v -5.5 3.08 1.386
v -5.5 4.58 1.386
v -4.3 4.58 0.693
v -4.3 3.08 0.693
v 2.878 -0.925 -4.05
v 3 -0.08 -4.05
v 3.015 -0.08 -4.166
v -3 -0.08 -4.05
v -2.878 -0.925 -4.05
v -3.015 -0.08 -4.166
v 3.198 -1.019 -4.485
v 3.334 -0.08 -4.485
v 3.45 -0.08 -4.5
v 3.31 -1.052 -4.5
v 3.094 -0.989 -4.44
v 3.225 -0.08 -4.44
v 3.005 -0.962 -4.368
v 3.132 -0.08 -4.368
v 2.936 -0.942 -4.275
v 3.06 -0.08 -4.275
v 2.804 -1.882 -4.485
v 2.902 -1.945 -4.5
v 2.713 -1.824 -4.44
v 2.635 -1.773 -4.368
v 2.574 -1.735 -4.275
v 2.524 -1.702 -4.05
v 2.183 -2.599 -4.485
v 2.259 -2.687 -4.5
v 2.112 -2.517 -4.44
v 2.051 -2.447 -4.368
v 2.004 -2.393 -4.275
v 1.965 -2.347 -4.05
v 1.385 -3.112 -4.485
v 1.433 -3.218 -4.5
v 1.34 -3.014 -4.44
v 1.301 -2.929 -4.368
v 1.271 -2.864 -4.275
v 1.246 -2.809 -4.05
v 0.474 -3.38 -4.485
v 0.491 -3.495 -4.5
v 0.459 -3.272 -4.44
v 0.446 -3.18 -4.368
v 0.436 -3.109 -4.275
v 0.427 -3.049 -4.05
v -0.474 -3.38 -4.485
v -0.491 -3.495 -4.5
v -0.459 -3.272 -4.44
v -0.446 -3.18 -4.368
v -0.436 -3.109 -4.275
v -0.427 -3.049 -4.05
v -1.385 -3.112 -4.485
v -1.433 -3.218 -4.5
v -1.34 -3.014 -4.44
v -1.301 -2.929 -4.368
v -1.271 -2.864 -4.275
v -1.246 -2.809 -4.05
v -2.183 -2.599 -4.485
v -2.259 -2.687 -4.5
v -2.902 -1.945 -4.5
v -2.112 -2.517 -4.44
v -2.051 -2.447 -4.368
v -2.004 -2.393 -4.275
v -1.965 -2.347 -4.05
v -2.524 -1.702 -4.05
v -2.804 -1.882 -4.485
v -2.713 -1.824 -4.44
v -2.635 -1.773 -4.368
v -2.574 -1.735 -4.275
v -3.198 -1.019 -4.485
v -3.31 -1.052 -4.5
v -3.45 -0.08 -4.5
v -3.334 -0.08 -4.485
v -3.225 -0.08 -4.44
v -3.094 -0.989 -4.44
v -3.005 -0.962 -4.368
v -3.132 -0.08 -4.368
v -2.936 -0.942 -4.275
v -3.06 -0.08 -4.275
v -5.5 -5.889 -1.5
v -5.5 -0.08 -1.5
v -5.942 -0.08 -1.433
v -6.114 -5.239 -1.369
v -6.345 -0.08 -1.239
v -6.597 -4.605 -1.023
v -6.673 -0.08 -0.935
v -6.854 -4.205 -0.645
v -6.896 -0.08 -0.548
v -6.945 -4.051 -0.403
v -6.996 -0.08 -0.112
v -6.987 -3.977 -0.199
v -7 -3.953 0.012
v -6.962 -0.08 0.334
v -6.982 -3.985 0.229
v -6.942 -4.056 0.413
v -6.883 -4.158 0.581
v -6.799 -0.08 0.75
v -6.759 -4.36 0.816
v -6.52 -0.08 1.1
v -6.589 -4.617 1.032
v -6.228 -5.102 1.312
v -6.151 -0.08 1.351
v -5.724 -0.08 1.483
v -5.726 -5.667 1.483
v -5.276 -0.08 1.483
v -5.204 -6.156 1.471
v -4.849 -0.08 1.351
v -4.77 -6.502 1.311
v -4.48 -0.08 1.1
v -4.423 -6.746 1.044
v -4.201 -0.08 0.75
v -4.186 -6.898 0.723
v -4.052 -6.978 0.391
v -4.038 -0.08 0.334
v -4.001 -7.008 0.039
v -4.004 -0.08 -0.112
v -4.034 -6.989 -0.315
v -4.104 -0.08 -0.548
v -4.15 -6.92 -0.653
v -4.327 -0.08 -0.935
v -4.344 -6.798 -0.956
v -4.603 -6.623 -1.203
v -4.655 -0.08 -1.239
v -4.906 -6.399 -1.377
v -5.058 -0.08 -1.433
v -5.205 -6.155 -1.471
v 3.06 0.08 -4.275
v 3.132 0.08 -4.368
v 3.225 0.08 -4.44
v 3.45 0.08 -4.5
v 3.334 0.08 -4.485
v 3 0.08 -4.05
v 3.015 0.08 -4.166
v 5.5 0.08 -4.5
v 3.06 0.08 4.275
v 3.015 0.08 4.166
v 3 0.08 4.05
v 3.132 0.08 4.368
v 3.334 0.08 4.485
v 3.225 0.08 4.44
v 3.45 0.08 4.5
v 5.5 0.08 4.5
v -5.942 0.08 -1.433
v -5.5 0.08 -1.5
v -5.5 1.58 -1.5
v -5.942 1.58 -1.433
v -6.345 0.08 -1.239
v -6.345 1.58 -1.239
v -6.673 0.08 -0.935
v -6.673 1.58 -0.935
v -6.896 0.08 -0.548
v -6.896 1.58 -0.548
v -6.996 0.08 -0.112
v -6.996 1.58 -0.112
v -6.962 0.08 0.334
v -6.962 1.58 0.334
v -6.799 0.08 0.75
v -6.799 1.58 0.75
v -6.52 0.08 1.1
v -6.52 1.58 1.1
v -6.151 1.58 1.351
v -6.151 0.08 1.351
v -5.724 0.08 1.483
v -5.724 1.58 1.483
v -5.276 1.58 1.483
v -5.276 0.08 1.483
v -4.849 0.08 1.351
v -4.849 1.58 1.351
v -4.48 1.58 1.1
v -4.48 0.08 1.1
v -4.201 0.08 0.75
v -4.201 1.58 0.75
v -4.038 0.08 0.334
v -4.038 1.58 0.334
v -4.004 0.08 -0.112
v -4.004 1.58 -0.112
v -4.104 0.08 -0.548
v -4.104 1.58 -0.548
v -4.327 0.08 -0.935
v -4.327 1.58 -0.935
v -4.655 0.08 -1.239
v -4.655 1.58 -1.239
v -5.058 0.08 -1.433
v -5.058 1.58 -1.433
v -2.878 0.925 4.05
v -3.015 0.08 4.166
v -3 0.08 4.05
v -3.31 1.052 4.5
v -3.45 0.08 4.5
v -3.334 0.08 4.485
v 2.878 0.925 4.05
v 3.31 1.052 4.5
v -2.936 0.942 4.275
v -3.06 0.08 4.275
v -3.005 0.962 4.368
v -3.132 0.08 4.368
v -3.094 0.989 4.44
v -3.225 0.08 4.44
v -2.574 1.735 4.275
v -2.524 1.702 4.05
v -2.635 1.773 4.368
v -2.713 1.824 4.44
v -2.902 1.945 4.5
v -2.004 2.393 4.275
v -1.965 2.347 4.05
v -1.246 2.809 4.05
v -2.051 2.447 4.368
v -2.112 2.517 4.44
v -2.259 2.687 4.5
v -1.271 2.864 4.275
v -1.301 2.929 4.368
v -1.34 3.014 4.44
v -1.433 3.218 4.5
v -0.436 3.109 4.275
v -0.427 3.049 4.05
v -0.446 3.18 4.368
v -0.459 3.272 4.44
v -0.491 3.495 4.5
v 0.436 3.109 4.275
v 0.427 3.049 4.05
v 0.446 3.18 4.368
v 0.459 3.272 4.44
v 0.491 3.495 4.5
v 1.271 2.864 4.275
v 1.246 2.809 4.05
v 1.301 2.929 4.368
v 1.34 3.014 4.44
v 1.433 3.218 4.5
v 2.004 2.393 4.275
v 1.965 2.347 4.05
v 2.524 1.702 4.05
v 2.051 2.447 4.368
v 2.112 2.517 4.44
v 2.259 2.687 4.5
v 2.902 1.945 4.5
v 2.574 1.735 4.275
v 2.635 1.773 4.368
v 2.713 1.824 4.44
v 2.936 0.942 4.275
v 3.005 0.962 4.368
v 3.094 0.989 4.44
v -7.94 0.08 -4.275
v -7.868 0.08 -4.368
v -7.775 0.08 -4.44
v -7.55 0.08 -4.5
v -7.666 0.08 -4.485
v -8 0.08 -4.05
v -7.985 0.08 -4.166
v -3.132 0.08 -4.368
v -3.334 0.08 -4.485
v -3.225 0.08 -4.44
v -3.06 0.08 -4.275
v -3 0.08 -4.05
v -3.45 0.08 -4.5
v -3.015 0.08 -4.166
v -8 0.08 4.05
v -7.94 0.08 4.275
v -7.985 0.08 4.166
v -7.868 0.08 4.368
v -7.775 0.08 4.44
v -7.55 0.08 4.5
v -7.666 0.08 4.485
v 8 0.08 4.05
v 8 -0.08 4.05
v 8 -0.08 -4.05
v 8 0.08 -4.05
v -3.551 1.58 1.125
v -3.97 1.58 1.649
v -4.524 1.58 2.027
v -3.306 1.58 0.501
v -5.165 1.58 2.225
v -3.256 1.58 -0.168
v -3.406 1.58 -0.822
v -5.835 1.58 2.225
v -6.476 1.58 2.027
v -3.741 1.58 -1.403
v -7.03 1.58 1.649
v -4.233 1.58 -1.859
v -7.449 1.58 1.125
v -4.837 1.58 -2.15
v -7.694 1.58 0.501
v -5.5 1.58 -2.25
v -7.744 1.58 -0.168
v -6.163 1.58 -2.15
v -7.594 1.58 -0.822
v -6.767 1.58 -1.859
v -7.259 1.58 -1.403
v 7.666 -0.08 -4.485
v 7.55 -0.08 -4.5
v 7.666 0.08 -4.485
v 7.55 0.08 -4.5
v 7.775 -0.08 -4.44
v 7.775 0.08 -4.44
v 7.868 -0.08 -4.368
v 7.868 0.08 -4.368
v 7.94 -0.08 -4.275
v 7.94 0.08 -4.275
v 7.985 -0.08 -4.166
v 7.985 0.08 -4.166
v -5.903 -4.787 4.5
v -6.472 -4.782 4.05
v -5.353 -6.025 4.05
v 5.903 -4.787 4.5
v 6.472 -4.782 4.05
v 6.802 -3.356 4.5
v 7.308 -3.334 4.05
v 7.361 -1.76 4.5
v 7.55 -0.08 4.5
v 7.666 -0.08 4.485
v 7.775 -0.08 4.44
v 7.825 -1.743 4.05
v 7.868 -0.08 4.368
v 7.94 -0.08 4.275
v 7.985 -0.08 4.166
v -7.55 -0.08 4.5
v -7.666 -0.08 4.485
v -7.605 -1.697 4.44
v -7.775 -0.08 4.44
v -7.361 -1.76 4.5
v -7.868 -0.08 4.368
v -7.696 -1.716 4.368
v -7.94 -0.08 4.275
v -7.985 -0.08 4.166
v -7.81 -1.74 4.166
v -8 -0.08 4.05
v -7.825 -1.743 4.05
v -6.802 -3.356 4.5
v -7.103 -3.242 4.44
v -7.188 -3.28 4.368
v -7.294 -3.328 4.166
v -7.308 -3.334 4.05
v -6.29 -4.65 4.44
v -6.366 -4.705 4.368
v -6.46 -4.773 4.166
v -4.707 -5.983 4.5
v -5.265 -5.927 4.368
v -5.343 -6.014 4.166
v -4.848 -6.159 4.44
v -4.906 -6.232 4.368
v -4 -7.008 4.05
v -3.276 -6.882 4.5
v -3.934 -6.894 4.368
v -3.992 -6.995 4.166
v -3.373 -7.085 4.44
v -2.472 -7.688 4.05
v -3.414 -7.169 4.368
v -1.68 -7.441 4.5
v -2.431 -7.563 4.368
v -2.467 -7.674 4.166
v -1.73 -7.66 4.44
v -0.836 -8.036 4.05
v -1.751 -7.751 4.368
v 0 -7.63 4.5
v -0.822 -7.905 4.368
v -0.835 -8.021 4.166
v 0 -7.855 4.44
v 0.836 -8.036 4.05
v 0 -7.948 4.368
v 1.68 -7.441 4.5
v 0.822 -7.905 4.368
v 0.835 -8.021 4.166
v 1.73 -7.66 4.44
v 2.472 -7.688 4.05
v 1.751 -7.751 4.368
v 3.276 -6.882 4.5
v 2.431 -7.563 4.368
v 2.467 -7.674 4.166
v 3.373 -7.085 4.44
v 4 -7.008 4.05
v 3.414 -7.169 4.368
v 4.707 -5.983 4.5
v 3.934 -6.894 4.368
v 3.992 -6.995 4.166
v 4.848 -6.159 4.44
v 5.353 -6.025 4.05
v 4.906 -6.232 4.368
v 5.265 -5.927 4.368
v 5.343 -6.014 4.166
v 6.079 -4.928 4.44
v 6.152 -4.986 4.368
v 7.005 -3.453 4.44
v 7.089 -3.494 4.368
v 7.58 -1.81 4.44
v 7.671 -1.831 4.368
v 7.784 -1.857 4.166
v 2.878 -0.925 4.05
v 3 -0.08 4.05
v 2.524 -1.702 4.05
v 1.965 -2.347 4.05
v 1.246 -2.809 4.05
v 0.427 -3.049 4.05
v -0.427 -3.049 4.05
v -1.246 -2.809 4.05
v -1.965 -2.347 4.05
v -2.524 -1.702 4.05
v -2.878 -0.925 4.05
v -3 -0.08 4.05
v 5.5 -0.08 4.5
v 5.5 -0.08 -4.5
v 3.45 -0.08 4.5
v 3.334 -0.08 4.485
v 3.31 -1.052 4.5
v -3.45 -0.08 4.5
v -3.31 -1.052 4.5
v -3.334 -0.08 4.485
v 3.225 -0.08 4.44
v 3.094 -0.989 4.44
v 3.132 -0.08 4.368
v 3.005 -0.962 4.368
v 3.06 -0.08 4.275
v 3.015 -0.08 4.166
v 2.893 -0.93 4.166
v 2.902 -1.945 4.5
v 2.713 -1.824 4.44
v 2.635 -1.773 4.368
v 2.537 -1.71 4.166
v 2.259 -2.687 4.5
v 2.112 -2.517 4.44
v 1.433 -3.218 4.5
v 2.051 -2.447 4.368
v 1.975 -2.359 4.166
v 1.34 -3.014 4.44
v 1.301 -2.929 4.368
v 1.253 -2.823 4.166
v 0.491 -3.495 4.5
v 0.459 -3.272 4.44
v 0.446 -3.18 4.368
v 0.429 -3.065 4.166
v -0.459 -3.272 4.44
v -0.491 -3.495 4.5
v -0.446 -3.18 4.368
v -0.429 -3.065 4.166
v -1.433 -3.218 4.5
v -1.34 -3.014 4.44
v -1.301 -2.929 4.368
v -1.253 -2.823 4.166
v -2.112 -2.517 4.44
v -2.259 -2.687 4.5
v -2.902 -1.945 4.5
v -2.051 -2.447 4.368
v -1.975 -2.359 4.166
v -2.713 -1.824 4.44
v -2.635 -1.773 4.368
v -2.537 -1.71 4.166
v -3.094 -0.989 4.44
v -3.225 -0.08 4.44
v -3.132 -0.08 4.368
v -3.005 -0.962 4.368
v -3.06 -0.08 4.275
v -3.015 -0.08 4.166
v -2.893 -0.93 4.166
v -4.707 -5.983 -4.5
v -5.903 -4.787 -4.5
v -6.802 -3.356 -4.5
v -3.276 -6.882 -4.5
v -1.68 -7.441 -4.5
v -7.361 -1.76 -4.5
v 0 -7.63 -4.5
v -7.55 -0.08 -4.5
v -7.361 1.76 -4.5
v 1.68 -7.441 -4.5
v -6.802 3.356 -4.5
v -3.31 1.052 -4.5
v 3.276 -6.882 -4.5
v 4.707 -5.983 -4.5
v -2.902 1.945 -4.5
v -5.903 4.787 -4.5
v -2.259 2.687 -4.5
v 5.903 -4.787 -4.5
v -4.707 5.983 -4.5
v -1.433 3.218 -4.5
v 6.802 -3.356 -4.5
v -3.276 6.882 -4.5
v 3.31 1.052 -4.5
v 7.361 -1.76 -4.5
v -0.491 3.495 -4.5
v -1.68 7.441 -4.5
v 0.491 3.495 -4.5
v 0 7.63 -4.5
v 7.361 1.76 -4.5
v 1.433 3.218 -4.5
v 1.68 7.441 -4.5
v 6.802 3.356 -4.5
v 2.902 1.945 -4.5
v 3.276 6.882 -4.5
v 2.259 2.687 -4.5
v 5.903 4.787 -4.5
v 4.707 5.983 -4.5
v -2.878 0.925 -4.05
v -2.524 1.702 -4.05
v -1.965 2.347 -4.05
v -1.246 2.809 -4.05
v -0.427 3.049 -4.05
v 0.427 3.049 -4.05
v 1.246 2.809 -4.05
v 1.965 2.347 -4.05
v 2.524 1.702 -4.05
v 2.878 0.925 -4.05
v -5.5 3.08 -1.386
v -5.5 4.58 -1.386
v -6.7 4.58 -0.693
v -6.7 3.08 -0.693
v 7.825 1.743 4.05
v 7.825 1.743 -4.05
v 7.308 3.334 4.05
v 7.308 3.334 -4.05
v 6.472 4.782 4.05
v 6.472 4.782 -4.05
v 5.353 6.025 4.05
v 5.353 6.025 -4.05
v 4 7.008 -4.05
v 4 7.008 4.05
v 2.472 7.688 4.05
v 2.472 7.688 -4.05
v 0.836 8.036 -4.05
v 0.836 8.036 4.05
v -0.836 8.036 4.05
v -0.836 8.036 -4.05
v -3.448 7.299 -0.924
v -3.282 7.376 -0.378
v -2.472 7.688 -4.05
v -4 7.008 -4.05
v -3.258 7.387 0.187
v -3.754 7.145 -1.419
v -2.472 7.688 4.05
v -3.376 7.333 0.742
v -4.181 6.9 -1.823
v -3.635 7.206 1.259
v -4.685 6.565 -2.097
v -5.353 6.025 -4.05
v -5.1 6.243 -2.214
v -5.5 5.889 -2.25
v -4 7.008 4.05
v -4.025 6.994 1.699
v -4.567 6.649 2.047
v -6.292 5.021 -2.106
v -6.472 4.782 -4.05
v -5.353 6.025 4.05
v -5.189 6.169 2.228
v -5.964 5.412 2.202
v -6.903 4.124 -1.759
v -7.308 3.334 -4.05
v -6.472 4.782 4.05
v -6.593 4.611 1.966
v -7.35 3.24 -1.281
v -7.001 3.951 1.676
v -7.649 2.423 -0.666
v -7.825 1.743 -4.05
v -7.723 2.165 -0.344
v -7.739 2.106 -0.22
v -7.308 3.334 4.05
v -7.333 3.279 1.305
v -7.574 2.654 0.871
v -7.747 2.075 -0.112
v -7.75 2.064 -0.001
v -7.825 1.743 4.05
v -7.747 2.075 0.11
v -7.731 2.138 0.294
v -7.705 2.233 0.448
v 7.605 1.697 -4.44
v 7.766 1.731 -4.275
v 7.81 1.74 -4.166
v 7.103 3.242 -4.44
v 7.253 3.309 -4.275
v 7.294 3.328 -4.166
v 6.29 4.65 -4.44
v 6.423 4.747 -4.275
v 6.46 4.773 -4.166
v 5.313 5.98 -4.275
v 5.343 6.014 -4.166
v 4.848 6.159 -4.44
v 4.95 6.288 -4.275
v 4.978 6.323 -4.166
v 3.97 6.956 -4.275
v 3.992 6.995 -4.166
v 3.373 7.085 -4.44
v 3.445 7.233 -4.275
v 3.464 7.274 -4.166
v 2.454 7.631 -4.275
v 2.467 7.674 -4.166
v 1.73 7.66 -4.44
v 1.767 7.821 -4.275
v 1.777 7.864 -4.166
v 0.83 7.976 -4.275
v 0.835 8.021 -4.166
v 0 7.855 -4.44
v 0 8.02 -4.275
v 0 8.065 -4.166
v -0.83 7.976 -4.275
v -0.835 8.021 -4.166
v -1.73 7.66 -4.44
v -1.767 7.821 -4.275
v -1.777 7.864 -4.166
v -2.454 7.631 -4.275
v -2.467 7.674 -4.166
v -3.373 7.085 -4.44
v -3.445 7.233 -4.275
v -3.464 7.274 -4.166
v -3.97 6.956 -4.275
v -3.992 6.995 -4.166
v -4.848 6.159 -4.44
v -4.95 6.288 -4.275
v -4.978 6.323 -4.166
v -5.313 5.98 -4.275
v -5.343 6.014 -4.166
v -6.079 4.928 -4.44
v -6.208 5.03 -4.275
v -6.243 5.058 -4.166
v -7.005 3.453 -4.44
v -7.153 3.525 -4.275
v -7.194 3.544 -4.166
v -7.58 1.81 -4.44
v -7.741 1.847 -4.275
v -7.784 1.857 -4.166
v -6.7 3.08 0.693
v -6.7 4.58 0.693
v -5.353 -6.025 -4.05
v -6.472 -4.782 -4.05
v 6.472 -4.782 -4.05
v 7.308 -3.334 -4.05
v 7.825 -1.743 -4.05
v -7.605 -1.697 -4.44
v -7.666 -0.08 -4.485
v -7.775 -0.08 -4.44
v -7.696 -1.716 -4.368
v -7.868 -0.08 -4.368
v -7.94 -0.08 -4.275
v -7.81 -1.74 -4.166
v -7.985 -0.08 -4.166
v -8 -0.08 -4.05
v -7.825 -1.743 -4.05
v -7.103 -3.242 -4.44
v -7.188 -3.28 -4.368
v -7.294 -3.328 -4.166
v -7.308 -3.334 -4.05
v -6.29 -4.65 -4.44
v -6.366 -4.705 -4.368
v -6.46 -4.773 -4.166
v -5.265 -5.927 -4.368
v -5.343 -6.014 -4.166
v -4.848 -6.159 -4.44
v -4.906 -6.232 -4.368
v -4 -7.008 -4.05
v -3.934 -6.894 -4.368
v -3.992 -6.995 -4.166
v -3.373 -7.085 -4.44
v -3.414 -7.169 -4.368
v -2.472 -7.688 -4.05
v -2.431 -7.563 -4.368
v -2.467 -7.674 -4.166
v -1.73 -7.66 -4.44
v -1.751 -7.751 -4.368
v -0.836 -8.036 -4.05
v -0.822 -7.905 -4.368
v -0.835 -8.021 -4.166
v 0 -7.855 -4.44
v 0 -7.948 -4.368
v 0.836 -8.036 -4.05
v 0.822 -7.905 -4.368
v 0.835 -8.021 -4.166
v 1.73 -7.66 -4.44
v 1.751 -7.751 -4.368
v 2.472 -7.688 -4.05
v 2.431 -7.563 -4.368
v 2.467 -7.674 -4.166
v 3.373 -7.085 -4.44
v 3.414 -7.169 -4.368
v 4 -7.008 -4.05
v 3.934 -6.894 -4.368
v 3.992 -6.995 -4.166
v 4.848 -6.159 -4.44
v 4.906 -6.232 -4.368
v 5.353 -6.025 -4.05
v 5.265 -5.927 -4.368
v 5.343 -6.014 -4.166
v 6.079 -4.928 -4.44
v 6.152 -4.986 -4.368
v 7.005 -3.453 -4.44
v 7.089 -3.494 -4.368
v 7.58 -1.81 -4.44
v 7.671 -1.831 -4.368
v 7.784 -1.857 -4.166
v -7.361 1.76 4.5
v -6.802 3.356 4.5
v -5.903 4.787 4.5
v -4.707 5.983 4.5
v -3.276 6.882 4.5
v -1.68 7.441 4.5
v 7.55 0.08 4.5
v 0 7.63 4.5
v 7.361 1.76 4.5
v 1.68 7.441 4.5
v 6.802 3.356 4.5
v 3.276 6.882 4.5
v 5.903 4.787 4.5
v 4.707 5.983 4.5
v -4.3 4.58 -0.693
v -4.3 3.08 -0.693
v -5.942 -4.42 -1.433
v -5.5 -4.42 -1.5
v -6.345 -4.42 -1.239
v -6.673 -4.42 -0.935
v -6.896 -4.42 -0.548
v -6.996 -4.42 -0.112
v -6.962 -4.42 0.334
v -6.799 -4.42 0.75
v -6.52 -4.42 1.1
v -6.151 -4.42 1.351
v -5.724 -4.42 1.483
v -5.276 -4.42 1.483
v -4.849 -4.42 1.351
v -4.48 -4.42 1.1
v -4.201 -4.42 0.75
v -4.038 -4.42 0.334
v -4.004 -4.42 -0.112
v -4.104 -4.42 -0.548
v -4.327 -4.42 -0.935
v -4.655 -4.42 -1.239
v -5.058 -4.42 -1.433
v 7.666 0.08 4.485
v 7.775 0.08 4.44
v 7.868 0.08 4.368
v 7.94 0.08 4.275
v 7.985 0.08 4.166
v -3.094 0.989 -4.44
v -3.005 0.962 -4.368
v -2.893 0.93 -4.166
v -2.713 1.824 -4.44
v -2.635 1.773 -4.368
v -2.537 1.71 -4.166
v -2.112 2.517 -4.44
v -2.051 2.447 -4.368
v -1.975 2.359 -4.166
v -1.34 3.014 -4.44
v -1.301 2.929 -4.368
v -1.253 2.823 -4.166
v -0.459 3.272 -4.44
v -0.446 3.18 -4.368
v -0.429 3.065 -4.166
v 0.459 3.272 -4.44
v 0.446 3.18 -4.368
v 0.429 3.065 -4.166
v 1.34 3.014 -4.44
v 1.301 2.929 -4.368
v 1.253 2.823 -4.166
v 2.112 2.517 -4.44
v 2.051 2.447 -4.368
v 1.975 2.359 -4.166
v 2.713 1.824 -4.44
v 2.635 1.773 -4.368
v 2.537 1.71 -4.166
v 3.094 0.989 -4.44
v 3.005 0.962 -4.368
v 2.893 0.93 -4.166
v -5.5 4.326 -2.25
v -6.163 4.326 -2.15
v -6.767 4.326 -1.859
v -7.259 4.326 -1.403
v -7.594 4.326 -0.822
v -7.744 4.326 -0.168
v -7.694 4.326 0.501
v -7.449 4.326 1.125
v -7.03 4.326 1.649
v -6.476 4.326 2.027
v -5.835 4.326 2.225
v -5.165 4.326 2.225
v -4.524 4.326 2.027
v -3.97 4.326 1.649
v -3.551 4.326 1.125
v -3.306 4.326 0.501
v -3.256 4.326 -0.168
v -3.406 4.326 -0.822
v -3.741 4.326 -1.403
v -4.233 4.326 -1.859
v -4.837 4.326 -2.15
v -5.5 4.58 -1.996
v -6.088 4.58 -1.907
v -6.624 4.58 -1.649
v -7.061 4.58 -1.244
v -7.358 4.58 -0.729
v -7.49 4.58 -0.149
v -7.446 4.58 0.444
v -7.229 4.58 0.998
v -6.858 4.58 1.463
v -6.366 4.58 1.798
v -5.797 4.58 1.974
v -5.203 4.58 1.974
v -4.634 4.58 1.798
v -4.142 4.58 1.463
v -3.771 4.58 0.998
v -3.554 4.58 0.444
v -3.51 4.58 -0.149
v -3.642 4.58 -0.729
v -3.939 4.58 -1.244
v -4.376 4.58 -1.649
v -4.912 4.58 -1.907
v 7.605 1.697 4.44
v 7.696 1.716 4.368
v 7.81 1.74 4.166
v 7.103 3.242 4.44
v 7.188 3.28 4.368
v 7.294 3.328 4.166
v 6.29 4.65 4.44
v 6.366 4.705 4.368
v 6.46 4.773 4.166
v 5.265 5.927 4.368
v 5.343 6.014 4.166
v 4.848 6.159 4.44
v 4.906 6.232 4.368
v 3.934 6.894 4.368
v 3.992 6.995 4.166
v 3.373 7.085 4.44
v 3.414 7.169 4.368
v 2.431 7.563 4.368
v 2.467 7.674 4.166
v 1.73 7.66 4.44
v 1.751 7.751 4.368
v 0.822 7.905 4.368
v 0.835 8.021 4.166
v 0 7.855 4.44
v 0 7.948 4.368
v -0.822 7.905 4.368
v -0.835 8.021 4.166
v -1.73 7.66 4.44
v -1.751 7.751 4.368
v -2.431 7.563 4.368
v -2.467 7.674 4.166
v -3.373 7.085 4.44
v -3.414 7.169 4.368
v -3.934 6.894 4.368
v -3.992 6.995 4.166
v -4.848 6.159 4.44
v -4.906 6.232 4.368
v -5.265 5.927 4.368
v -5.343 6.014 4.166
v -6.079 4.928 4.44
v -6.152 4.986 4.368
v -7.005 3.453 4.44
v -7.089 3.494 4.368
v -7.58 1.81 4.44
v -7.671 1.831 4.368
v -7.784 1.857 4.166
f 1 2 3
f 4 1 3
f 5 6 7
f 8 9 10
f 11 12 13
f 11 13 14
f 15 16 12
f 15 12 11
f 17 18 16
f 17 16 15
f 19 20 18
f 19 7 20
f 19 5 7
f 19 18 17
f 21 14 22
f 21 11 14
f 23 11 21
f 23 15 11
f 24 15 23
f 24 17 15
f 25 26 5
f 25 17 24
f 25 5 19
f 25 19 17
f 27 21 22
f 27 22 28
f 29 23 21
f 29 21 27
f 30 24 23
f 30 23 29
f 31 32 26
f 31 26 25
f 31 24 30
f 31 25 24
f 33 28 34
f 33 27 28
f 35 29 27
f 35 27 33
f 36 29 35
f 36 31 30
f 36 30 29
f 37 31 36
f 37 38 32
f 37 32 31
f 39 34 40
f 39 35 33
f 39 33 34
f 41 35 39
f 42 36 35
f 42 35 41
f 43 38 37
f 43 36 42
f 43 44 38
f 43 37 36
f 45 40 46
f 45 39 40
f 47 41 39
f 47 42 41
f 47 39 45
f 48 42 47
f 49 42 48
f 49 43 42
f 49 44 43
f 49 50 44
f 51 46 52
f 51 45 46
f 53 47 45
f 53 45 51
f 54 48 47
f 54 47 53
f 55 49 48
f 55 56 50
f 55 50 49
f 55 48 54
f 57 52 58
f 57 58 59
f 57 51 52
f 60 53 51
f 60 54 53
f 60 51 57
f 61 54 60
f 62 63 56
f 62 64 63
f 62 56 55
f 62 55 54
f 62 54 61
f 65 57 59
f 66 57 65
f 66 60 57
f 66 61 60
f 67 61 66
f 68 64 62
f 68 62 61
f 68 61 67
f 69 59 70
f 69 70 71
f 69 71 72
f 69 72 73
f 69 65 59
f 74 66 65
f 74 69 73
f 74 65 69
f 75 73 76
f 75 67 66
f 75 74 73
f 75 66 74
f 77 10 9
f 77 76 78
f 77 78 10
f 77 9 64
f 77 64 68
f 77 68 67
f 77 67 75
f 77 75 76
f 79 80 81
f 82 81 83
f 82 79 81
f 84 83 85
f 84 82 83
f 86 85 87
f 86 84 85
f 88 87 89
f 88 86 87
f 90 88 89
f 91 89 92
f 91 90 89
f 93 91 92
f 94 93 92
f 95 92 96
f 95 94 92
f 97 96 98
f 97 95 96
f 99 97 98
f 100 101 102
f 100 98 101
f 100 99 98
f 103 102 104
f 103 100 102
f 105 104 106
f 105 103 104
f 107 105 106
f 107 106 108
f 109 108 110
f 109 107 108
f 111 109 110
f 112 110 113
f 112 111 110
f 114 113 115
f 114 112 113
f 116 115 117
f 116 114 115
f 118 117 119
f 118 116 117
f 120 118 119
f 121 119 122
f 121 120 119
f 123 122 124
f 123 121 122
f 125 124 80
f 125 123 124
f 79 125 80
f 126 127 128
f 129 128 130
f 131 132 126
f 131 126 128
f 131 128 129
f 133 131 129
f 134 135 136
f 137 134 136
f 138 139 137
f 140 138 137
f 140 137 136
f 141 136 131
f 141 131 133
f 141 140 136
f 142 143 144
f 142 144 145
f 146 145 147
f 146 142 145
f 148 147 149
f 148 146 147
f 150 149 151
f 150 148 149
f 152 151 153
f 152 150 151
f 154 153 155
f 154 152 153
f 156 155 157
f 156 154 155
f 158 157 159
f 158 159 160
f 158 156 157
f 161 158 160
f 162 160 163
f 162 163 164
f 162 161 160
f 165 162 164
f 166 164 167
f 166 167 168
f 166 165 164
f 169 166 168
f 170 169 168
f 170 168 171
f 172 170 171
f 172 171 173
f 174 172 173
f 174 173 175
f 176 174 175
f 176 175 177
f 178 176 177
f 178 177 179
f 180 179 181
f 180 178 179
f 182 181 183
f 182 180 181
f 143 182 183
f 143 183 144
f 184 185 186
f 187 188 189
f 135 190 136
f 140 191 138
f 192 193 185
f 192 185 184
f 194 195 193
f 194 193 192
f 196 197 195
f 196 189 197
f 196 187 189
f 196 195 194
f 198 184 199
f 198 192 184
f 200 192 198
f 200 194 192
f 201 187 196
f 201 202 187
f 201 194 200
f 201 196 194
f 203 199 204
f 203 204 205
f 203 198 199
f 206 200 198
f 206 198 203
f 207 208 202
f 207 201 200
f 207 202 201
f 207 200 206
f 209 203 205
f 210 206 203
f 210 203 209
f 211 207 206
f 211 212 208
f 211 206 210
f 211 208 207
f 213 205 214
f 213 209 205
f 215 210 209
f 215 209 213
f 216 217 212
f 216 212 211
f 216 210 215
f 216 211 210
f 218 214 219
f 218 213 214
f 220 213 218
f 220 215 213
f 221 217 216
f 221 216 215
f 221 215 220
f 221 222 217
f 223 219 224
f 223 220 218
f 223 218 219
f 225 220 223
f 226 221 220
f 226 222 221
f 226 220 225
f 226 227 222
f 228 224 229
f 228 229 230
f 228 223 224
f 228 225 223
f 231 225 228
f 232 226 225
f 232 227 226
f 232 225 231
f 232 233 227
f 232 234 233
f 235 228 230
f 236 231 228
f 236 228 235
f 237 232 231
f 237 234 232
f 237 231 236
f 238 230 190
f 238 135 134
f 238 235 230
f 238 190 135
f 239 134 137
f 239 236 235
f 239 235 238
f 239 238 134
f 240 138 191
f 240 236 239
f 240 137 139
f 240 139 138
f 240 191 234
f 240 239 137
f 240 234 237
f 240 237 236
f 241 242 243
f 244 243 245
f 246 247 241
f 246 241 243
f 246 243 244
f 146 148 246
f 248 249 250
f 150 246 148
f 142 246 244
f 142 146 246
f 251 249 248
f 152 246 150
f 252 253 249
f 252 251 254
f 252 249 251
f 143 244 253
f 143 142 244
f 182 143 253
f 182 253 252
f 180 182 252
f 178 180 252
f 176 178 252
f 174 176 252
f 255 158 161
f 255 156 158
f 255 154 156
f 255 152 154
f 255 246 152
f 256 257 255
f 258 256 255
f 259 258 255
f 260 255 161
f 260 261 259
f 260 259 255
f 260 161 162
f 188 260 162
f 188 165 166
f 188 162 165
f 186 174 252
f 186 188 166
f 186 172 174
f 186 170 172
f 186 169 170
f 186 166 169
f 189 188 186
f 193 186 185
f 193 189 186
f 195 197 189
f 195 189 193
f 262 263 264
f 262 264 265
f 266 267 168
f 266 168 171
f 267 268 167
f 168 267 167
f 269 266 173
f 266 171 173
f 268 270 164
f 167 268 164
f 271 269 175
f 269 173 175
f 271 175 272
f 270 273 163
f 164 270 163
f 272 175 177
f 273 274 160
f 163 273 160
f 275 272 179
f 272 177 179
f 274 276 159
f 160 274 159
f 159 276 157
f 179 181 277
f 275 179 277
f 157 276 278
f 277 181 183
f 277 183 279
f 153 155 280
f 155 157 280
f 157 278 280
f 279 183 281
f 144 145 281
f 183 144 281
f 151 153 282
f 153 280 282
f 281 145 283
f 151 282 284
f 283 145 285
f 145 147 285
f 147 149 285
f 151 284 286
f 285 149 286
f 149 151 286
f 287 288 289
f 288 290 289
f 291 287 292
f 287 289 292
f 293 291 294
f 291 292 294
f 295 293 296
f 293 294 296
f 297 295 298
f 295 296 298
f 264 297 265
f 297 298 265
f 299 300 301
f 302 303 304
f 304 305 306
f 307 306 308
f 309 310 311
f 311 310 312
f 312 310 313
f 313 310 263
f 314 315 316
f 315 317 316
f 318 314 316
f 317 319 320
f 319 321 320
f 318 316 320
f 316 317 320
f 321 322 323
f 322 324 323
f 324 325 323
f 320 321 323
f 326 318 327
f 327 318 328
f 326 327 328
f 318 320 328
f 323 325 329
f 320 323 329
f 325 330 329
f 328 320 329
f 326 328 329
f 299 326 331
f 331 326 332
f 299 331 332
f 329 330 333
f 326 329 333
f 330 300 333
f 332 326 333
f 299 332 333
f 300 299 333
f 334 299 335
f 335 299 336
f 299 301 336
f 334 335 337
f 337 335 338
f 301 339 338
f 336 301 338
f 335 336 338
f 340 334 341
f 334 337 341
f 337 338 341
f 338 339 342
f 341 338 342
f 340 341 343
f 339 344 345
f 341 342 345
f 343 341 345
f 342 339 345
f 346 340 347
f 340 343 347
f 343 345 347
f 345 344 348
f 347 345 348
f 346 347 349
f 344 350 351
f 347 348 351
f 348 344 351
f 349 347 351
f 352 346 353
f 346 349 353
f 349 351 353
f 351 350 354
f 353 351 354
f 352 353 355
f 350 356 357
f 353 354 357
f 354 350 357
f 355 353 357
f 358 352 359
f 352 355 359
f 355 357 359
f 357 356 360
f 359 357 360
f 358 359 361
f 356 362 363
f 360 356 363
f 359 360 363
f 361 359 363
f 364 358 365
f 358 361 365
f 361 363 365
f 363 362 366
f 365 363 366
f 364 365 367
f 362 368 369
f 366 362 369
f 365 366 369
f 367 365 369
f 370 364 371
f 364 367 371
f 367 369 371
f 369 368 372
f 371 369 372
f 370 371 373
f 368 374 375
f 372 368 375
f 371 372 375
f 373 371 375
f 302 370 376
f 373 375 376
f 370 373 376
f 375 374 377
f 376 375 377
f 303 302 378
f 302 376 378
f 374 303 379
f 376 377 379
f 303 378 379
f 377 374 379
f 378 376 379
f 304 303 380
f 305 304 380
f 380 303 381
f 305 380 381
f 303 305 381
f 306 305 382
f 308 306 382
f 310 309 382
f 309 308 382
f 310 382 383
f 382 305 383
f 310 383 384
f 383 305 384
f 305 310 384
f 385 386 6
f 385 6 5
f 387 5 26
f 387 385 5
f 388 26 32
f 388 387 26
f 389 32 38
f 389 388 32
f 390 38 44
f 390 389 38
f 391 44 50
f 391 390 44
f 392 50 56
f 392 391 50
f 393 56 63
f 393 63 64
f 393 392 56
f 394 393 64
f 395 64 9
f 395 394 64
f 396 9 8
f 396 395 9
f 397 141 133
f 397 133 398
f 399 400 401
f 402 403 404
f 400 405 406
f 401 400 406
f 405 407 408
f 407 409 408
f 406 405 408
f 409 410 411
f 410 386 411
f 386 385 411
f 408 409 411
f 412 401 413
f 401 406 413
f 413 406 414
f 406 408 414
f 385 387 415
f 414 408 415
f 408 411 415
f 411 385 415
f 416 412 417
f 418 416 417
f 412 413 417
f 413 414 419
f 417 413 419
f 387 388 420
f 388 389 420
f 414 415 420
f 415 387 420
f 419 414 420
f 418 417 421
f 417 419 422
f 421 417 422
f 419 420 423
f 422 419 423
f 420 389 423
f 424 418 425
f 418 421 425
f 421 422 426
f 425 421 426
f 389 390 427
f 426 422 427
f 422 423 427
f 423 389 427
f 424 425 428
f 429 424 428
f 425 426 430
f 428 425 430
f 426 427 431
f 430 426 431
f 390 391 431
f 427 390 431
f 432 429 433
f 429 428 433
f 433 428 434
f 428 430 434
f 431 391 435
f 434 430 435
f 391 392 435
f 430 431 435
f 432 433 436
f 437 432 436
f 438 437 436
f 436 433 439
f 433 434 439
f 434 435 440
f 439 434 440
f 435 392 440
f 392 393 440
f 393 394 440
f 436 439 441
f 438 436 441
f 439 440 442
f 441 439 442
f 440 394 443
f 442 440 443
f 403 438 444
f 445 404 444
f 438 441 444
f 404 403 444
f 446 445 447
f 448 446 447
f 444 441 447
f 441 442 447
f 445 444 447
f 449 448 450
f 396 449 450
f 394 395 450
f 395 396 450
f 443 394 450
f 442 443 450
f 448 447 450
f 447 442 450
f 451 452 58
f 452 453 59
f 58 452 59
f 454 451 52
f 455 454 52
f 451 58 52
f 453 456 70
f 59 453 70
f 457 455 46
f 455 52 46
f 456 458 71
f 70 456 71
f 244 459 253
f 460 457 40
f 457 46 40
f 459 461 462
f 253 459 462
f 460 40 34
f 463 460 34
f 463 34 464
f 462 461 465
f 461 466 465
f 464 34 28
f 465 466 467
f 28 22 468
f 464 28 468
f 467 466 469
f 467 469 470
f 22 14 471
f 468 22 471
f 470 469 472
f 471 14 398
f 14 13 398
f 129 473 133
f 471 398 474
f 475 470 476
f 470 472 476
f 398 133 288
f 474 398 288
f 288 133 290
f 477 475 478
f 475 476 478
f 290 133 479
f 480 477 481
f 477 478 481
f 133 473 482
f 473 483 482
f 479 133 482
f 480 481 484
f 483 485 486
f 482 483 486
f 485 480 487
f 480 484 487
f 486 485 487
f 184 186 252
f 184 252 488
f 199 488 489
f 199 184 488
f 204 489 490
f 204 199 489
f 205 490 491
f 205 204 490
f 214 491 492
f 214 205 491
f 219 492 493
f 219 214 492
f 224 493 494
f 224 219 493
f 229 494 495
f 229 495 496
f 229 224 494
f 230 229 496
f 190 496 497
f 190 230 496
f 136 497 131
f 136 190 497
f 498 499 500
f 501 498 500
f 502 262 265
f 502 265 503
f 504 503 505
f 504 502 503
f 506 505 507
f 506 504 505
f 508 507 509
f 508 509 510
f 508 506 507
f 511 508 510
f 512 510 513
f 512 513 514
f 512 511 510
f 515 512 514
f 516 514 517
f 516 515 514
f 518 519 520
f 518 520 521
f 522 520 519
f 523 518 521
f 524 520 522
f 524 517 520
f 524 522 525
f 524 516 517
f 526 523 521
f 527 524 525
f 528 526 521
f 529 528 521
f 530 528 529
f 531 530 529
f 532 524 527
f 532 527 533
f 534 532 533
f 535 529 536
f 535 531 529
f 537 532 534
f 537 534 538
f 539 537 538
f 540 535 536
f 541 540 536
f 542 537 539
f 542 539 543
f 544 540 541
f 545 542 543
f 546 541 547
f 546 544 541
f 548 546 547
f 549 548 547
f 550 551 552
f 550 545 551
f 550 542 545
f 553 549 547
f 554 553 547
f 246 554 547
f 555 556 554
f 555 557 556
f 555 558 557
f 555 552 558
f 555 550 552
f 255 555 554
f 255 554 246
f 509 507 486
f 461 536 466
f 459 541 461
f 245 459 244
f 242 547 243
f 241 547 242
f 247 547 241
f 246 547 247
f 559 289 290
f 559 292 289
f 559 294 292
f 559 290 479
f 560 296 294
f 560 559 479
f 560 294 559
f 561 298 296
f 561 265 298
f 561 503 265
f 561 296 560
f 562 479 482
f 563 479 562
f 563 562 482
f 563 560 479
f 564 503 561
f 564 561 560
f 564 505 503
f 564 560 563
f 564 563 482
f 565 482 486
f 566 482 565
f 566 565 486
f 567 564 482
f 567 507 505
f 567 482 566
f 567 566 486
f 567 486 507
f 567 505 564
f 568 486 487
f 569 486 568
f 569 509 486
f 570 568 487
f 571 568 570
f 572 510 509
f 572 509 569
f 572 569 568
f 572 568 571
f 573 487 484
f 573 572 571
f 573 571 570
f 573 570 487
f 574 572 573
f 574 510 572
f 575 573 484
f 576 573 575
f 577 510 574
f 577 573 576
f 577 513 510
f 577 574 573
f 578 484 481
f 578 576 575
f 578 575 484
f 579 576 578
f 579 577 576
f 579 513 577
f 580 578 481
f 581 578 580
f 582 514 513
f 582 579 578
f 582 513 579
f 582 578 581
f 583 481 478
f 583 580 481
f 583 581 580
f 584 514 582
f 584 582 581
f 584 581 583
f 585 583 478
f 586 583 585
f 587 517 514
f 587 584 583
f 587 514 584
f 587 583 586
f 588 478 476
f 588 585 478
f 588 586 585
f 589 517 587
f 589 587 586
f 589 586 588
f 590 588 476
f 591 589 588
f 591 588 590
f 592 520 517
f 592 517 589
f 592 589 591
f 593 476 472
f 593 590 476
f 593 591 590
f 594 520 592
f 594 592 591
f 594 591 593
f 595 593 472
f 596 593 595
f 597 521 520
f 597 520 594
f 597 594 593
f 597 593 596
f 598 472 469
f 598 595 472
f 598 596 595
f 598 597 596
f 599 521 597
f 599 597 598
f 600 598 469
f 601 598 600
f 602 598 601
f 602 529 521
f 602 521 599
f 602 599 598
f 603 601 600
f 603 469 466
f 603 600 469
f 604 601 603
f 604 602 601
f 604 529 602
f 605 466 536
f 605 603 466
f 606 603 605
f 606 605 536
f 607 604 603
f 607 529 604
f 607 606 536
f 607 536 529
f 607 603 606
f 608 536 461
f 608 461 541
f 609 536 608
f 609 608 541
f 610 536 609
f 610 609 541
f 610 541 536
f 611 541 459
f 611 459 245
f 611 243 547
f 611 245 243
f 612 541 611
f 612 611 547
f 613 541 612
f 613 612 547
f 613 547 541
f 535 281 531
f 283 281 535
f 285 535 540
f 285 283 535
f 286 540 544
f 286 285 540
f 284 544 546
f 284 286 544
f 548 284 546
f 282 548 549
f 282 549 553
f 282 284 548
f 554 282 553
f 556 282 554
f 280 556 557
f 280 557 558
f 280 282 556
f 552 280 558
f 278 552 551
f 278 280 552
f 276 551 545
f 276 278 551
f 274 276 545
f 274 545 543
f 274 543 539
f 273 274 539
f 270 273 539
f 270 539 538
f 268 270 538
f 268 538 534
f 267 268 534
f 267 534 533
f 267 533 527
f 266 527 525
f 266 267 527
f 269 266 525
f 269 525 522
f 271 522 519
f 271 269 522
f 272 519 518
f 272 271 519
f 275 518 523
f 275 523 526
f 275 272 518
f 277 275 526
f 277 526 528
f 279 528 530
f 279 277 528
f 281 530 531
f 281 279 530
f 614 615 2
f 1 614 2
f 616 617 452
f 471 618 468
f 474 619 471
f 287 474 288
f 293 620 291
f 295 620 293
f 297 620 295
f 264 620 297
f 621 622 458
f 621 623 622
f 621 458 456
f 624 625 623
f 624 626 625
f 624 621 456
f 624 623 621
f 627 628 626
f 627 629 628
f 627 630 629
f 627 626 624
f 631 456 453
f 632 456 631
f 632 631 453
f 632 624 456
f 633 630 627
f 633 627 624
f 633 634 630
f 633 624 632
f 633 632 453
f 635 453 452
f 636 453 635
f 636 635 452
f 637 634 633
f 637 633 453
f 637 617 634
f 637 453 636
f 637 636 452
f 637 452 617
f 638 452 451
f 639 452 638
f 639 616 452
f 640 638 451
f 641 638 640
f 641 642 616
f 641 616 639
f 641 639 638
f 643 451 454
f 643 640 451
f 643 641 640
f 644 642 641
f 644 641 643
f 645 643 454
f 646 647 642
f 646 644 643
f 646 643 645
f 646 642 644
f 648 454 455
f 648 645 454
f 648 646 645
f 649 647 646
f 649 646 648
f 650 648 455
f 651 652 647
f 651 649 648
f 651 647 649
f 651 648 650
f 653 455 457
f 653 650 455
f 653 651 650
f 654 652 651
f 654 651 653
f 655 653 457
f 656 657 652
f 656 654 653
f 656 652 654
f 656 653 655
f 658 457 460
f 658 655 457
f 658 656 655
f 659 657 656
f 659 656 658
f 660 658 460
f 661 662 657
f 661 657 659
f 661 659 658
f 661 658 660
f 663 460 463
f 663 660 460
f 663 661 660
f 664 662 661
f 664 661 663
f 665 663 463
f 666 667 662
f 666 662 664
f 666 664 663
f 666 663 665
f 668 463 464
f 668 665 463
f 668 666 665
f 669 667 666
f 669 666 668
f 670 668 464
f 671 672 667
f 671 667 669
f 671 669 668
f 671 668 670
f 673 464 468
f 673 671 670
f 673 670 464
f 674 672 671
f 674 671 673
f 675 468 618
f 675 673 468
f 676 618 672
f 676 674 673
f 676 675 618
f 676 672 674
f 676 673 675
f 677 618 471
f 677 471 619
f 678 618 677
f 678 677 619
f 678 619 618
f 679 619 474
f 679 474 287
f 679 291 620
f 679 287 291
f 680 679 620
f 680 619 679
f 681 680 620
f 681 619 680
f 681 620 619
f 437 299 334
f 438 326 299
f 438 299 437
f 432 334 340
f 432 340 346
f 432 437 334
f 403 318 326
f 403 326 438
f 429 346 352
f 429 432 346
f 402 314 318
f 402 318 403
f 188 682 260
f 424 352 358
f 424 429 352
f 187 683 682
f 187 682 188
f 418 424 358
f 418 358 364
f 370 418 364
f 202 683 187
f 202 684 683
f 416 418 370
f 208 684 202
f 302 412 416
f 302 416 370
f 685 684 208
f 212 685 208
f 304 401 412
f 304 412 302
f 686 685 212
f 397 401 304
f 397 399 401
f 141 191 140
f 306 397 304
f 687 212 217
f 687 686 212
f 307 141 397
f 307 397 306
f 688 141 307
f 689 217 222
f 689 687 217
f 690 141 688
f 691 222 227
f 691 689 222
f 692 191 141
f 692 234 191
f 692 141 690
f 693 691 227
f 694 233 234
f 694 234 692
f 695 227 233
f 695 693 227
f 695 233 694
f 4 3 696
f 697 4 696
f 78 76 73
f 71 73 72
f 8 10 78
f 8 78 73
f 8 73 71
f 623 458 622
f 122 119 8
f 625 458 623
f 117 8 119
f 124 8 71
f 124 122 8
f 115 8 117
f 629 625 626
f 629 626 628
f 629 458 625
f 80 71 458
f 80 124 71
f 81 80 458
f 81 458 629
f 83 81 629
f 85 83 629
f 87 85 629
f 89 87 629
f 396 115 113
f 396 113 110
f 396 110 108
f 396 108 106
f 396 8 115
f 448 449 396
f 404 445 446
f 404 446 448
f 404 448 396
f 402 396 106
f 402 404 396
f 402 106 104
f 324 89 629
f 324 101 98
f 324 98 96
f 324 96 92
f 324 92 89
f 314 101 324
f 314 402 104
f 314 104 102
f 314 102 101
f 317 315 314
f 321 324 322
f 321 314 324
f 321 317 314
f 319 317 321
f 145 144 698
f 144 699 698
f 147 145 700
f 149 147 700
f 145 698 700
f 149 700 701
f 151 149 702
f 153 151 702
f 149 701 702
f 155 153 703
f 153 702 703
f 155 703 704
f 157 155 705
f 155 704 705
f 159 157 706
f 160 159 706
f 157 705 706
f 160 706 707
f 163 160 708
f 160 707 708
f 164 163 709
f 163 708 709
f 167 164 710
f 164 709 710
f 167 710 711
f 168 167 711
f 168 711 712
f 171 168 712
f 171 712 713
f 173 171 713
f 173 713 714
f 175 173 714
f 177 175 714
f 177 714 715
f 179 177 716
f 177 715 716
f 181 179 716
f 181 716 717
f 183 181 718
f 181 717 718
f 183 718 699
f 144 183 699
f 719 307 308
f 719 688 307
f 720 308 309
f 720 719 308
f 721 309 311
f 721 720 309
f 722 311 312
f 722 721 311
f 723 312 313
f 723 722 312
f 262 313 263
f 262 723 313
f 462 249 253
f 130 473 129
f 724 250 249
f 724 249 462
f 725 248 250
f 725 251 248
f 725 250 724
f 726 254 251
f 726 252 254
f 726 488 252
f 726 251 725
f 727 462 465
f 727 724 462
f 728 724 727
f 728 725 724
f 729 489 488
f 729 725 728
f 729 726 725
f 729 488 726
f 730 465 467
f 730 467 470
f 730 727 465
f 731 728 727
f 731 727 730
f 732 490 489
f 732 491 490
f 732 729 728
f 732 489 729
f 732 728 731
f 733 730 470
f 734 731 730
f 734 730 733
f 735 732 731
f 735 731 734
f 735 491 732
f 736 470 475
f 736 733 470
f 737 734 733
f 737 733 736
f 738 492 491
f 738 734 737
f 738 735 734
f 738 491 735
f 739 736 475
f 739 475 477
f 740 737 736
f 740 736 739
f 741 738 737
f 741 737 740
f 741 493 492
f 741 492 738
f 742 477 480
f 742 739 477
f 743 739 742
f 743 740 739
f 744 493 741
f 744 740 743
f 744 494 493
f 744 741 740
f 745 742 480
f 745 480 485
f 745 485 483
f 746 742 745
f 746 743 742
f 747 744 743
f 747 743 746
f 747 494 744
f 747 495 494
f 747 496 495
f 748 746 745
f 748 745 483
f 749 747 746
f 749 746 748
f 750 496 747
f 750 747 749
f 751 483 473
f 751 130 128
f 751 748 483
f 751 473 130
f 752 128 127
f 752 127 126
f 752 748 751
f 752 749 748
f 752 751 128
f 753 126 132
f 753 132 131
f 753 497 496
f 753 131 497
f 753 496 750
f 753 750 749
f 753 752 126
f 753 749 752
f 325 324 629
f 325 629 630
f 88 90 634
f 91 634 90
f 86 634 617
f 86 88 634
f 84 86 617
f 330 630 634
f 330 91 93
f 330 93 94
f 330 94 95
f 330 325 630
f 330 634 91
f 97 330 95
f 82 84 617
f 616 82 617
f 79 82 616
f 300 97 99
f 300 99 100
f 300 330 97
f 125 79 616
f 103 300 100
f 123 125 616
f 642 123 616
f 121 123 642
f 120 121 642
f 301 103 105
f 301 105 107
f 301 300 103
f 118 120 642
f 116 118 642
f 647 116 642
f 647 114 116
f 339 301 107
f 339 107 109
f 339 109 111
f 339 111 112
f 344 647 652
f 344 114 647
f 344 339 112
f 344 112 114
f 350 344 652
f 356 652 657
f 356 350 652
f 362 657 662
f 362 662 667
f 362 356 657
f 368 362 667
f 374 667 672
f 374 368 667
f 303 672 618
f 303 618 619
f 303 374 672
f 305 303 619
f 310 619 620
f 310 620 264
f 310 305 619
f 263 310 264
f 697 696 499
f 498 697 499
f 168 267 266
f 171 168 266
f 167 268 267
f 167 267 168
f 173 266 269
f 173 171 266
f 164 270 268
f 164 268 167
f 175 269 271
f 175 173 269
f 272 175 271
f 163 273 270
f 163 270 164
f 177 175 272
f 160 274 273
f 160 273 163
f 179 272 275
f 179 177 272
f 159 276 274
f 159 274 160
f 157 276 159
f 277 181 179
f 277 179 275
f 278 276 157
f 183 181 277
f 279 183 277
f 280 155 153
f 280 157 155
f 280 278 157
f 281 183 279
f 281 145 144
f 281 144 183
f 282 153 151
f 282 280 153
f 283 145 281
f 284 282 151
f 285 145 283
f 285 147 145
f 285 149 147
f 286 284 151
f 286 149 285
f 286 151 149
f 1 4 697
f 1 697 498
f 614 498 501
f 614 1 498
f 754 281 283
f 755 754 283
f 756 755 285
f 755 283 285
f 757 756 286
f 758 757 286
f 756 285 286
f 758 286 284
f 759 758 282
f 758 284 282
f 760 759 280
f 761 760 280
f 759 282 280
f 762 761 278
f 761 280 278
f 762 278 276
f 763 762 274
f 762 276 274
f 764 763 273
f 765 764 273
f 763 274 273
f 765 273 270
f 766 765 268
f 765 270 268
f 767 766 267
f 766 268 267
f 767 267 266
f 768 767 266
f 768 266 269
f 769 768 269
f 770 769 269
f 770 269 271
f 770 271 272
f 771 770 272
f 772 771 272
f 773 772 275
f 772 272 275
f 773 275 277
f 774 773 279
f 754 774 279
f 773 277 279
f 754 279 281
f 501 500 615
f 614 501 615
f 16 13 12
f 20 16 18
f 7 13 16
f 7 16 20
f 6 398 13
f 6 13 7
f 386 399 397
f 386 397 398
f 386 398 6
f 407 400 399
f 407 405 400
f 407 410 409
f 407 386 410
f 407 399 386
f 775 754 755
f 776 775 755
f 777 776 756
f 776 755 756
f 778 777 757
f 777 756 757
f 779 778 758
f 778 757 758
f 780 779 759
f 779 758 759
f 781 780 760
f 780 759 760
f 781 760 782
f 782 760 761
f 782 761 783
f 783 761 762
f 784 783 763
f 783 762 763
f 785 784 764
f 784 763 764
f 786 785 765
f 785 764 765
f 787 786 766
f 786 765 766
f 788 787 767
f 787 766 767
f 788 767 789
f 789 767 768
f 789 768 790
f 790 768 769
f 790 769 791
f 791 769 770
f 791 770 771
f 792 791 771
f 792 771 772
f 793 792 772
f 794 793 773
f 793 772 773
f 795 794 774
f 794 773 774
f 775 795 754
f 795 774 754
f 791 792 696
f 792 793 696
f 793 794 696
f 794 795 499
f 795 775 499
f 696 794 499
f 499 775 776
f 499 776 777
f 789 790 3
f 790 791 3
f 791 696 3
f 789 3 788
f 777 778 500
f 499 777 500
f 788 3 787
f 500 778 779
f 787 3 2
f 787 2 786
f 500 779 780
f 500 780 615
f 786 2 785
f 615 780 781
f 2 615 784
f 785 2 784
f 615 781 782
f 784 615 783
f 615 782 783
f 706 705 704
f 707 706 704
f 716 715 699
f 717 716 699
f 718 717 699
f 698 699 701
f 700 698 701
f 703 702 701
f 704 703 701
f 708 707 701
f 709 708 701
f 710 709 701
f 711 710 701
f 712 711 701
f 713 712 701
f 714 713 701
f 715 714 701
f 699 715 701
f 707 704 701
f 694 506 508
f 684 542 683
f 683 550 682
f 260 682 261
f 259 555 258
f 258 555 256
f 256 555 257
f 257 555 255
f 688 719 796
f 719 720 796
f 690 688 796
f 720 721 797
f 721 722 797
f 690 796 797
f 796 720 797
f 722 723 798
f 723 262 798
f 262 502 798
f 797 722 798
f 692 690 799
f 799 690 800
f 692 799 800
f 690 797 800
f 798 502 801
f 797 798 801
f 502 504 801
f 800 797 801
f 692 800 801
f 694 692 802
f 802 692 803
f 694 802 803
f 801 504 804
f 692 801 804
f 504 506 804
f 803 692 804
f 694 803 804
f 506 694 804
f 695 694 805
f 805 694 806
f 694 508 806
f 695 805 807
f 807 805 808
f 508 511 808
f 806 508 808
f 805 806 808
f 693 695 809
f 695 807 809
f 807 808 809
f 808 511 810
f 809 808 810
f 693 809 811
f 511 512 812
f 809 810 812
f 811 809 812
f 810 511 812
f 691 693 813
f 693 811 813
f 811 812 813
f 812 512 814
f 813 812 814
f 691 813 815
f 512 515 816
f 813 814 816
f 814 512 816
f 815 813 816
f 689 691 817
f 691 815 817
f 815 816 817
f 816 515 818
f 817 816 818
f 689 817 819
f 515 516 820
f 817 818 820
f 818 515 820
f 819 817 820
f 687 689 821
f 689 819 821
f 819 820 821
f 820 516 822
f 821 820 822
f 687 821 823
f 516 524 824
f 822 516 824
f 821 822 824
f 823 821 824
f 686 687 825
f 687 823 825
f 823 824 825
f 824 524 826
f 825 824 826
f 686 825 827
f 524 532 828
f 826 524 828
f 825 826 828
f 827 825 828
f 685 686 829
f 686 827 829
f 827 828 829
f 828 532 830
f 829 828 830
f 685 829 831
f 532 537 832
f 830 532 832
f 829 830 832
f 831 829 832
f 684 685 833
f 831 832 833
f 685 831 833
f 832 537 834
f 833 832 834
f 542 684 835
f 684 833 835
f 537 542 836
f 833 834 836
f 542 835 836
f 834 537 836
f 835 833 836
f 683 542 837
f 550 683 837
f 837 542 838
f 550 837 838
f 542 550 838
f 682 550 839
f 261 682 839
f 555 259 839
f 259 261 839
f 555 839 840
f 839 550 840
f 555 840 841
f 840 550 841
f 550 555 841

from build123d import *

# Parameters (mm, degrees)
EXTRUDE1_DEPTH     = 4.5
CUT_EXTRUDE2_DEPTH = 1.5
FILLET1_R          = 0.45
FILLET2_R          = 0.45
CHAMFER2_SIZE      = 0.254


with BuildPart() as part:
    # Sketch1 → Extrude1 (new, symmetric)
    with BuildSketch(Plane.XY):
        with BuildLine():
            Line((-8, 0.08), (-3, 0.08))
            ThreePointArc((-3, 0.08), (0, 3.08), (3, 0.08))
            Line((3, 0.08), (5.5, 0.08))
            Line((5.5, 0.08), (5.5, -0.08))
            Line((5.5, -0.08), (3, -0.08))
            ThreePointArc((3, -0.08), (0, -3.08), (-3, -0.08))
            Line((-3, -0.08), (-8, -0.08))
            ThreePointArc((-8, -0.08), (0, -8.08), (8, -0.08))
            Line((8, -0.08), (8, 0.08))
            ThreePointArc((8, 0.08), (0, 8.08), (-8, 0.08))
        make_face()
    extrude(amount=EXTRUDE1_DEPTH, both=True)

    # Sketch4 → Cut-Revolve1 (revolve, cut)
    with BuildSketch(Plane.XY):
        Polygon((-5.5, 8.08), (-3.25, 8.08), (-3.25, 1.58), (-4, 1.58), (-4, -8.08), (-5.5, -8.08), align=None)
    revolve(axis=Axis((-5.5, -8.08, 0), (0, 1, 0)), mode=Mode.SUBTRACT)

    # Fillet1
    fillet1_edges = [part.edges().sort_by_distance(p)[0] for p in [
        (0, 3.08, -4.5),
        (0, 3.08, 4.5),
        (0, 8.08, -4.5),
        (0, 8.08, 4.5),
        (0, -8.08, -4.5),
        (0, -8.08, 4.5),
        (8, 0, -4.5),
        (8, 0, 4.5),
    ]]
    fillet(fillet1_edges, radius=FILLET1_R)

    # Fillet2
    fillet2_edges = [part.edges().sort_by_distance(p)[0] for p in [
        (0, -3.08, -4.5),
        (0, -3.08, 4.5),
    ]]
    fillet(fillet2_edges, radius=FILLET2_R)


with BuildPart() as body_2:
    # Sketch6 → Revolve1 (revolve)
    with BuildSketch(Plane.XY):
        Polygon((-5.5, 4.58), (-3.25, 4.58), (-3.25, 1.58), (-4, 1.58), (-4, -4.42), (-5.5, -4.42), align=None)
    revolve(axis=Axis((-5.5, -4.42, 0), (0, 1, 0)))

    # Sketch7 → Cut-Extrude2 (cut)
    with BuildSketch(Plane(origin=(0, 4.58, 0), x_dir=(-1, 0, 0), z_dir=(0, 1, 0))):
        Polygon((5.5, -1.385640646), (6.7, -0.692820323), (6.7, 0.692820323), (5.5, 1.385640646), (4.3, 0.692820323), (4.3, -0.692820323), align=None)
    extrude(amount=-CUT_EXTRUDE2_DEPTH, mode=Mode.SUBTRACT)

    # Chamfer2
    chamfer2_edges = [body_2.edges().sort_by_distance(p)[0] for p in [
        (-7.75, 4.58, 0),
    ]]
    chamfer(chamfer2_edges, length=CHAMFER2_SIZE)


solid = Compound([part.part, body_2.part])
